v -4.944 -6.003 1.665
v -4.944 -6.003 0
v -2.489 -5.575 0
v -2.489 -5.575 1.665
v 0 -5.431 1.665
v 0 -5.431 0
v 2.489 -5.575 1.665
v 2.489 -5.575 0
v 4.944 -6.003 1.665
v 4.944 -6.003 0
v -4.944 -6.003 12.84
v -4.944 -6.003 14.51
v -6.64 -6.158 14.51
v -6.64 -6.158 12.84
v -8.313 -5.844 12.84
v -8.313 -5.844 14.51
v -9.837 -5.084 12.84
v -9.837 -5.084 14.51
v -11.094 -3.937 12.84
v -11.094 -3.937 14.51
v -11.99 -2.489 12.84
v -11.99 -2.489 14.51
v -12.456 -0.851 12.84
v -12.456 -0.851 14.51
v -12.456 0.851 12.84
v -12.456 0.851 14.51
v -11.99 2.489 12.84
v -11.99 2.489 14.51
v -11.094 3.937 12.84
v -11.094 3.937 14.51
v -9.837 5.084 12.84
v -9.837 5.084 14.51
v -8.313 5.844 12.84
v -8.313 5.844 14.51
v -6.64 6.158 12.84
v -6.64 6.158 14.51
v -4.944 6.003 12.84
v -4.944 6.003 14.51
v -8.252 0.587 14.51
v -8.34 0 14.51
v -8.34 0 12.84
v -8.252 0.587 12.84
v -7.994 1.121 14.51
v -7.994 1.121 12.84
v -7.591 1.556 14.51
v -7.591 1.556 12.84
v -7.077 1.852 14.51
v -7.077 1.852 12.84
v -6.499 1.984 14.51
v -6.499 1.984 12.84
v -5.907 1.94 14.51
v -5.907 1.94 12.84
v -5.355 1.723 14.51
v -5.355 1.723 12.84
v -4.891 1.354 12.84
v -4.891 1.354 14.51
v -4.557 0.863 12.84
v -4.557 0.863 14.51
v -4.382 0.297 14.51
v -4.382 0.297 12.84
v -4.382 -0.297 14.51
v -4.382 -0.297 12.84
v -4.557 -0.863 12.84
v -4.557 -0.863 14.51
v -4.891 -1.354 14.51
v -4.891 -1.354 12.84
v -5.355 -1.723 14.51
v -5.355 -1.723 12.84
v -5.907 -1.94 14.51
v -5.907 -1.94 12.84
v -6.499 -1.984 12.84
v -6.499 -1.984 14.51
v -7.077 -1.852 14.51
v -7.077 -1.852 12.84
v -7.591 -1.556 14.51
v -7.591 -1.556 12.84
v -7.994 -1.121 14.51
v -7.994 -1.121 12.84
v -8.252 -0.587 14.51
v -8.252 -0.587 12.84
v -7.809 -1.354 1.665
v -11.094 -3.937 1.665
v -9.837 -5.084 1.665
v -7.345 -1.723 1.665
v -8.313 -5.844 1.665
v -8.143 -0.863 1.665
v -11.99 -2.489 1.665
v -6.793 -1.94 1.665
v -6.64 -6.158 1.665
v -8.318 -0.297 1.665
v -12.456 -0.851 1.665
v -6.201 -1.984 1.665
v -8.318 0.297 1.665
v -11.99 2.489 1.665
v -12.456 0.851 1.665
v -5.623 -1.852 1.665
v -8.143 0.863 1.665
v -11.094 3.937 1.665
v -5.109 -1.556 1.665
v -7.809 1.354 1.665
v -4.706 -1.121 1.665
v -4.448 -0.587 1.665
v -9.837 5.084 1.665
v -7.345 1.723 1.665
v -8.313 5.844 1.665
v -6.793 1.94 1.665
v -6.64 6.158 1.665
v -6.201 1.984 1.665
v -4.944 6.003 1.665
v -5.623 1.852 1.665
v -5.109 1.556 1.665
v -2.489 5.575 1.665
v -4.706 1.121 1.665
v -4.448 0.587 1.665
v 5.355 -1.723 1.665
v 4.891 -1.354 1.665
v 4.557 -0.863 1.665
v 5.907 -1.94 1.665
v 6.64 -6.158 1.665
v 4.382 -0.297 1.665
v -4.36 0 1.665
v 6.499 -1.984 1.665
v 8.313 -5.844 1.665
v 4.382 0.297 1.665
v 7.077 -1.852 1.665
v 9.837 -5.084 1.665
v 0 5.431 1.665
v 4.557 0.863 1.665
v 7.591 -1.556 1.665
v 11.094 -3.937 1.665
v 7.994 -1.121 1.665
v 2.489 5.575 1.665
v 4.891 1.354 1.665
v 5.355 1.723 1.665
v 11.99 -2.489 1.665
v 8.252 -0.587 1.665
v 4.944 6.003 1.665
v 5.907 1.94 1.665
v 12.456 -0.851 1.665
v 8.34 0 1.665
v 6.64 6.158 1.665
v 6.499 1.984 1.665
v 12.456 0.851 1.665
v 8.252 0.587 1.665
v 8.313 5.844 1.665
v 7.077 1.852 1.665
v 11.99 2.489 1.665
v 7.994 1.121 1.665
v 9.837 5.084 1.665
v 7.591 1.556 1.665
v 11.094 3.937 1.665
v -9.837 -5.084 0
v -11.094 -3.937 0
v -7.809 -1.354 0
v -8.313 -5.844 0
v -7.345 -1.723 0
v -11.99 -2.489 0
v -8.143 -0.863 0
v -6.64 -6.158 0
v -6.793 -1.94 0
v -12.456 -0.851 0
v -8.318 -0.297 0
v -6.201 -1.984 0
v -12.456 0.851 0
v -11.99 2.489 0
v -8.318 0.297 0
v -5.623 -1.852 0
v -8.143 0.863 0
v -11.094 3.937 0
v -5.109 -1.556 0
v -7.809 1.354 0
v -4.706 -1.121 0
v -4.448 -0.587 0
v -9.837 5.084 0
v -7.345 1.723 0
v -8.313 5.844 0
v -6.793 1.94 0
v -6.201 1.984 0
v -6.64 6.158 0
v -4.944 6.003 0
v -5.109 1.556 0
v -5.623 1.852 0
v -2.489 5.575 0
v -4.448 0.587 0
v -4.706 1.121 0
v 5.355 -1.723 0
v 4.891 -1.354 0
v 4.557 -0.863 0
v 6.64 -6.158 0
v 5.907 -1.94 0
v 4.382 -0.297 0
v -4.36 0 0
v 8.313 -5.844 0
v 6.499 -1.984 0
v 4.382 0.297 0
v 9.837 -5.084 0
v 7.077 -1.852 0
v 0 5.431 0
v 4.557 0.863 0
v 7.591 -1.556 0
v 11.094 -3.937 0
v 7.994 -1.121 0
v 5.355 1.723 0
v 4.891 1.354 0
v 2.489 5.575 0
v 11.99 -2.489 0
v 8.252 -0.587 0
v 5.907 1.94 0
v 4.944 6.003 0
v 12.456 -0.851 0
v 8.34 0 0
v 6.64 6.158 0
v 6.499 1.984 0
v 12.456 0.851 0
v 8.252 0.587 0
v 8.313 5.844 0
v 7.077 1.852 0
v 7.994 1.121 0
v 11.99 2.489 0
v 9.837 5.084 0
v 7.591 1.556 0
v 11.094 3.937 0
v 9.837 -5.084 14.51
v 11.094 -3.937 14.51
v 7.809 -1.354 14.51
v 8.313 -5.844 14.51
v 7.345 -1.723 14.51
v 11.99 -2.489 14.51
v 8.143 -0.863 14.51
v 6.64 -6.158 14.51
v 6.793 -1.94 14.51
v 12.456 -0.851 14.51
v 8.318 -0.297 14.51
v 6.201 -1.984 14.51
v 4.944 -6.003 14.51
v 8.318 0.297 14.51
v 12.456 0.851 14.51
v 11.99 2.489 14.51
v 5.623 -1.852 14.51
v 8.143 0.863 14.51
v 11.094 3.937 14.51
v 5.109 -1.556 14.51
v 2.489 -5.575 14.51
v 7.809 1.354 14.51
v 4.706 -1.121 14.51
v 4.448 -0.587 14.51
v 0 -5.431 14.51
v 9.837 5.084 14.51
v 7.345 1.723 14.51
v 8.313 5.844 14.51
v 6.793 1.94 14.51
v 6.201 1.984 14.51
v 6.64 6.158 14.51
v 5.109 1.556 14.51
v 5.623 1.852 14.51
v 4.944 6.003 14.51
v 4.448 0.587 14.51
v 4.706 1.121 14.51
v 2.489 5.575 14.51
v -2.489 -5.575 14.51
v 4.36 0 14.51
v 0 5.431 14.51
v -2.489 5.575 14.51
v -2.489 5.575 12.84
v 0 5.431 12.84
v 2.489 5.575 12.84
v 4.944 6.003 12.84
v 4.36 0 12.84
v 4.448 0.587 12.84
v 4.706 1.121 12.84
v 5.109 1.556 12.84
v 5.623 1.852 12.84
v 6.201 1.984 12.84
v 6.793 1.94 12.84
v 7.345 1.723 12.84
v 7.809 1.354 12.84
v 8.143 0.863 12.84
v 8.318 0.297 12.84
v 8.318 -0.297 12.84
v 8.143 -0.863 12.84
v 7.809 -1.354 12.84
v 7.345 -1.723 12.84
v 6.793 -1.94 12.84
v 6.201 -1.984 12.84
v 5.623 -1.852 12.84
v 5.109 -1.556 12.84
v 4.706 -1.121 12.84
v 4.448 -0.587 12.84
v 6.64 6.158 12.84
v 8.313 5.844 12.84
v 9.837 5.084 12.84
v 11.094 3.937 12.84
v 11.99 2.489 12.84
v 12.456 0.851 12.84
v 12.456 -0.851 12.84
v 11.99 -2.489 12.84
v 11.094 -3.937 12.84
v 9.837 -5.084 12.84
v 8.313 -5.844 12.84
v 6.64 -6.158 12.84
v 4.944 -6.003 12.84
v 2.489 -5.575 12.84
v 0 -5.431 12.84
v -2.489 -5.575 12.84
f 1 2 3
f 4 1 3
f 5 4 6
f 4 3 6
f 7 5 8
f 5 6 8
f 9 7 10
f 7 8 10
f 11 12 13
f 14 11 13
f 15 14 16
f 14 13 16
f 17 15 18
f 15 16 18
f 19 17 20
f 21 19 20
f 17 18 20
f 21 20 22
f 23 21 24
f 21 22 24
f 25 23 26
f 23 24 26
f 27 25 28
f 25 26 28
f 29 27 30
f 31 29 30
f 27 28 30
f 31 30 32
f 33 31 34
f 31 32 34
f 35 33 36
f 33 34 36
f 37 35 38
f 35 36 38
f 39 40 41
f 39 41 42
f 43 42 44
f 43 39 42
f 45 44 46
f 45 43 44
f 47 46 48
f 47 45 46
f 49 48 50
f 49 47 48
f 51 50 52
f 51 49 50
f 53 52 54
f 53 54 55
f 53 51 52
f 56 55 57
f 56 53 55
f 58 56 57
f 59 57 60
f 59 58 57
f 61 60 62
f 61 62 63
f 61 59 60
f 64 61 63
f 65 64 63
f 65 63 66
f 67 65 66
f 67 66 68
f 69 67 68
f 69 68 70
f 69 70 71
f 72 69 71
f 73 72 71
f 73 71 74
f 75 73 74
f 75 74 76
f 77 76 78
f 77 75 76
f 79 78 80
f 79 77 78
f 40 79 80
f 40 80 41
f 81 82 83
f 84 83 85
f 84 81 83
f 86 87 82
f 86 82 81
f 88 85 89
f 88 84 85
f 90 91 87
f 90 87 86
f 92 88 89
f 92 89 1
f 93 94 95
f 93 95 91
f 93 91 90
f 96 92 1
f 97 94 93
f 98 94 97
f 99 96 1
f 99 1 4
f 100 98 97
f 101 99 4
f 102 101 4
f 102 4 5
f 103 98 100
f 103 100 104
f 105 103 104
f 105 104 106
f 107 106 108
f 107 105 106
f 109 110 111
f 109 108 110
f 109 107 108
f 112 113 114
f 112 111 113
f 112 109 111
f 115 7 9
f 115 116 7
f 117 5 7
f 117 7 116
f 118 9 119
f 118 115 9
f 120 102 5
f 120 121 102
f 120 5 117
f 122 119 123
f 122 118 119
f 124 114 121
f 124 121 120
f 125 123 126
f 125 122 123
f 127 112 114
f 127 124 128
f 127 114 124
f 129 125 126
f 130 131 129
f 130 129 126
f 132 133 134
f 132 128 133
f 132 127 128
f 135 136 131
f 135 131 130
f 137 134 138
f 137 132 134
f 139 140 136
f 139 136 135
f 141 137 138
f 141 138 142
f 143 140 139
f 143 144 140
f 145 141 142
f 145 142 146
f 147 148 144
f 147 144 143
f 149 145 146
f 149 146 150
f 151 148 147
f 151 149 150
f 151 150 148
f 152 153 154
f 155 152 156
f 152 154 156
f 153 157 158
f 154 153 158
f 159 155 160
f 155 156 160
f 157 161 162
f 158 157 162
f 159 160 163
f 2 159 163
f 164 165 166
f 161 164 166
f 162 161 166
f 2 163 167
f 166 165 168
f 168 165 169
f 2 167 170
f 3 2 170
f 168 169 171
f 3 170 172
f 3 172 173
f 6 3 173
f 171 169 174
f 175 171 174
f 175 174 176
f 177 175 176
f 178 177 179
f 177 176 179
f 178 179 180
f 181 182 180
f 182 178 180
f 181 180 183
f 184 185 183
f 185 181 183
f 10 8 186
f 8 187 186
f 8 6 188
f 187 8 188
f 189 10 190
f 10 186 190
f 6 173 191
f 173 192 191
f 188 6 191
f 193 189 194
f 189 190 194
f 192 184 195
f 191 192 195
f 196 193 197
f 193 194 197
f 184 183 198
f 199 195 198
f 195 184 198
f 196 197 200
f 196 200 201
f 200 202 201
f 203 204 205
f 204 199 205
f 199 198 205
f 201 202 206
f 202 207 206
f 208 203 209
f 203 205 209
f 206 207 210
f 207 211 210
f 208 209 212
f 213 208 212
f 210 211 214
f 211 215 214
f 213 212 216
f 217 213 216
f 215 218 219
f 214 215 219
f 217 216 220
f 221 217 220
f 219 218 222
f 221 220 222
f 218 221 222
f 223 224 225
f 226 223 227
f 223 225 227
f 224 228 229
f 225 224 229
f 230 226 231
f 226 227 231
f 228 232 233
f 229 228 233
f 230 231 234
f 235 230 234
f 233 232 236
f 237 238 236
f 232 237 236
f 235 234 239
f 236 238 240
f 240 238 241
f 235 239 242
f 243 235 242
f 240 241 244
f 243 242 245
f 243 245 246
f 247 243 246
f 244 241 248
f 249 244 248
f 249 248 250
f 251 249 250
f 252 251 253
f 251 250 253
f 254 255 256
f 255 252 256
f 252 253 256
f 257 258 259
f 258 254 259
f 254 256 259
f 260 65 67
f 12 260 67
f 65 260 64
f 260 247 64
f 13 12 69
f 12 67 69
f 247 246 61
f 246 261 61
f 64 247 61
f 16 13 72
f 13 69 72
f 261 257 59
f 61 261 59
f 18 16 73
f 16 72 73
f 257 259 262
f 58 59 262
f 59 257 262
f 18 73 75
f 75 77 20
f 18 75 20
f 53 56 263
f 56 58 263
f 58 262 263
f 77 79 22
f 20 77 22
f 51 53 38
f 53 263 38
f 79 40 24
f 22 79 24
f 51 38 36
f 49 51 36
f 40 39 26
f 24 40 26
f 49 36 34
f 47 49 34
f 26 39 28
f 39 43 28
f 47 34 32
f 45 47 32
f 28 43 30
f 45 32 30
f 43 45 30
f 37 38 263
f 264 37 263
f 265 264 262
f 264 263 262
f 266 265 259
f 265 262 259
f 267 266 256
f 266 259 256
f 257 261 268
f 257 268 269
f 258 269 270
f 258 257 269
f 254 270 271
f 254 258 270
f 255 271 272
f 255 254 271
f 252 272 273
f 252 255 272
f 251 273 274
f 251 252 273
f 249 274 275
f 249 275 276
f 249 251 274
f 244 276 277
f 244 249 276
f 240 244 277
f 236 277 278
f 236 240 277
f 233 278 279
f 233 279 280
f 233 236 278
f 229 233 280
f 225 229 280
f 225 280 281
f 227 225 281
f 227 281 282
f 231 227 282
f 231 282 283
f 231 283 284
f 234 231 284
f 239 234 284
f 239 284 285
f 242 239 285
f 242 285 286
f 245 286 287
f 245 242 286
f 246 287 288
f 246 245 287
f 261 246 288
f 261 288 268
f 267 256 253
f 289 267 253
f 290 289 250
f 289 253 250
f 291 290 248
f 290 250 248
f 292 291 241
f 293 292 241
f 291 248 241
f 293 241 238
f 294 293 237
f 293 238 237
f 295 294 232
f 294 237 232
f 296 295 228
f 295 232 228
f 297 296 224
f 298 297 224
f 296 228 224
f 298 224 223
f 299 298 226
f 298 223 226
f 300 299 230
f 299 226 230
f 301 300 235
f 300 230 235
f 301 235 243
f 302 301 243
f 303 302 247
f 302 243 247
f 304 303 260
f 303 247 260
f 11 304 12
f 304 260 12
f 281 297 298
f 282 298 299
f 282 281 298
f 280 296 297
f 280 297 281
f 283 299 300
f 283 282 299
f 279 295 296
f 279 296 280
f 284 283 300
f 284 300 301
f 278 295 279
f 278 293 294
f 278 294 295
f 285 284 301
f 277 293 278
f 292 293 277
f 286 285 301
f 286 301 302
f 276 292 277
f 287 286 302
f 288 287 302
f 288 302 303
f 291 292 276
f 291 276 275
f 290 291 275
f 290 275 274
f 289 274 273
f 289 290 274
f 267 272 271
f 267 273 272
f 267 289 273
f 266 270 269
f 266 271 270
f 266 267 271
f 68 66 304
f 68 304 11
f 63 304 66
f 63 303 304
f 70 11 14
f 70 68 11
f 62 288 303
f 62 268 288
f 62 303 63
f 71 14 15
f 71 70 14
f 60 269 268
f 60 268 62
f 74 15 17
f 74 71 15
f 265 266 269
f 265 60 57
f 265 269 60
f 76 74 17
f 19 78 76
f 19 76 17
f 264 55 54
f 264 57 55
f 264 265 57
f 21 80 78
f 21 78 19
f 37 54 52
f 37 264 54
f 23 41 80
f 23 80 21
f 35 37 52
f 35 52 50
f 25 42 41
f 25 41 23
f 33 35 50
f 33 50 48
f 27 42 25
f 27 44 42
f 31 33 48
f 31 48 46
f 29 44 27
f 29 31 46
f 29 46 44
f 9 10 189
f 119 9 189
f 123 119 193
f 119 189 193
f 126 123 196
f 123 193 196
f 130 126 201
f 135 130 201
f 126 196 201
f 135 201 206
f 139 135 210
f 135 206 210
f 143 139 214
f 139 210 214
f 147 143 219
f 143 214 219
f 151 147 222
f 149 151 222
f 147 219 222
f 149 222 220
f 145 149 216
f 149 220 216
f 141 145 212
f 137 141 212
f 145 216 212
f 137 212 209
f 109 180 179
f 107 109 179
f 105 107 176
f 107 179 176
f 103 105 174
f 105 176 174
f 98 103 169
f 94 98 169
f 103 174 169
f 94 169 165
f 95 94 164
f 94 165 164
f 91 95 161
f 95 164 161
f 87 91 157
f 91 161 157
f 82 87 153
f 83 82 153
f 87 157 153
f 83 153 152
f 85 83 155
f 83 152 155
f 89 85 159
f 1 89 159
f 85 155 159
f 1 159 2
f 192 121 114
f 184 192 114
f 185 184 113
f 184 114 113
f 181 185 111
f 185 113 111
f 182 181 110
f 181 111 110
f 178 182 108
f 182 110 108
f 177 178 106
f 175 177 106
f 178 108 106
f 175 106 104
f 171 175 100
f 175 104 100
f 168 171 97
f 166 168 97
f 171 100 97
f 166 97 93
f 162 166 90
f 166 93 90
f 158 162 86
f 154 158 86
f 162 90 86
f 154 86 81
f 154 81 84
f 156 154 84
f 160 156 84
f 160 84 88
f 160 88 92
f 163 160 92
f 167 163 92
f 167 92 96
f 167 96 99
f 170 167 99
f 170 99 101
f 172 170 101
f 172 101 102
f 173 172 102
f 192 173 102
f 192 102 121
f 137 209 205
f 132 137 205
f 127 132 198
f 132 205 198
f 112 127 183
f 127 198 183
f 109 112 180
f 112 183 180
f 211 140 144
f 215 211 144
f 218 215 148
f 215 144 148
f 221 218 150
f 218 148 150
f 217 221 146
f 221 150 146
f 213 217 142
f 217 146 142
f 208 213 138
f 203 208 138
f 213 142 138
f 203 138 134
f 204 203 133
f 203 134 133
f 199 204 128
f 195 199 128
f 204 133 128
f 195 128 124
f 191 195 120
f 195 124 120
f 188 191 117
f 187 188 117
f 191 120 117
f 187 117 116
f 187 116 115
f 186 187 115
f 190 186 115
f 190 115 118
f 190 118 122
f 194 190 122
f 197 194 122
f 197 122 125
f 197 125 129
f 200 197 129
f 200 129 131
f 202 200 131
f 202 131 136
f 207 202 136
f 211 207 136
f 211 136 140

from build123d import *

# Parameters (mm, degrees)
EXTRUDE_1_DEPTH     = 1.665
SKETCH_3_R          = 1.99
CUT_EXTRUDE_1_DEPTH = 15.050077402
SKETCH_4_R          = 1.99
EXTRUDE_1_2_DEPTH   = 1.67


with BuildPart() as part:
    # 草图2 → Extrude 1 (new body)
    with BuildSketch(Plane.XY):
        with BuildLine():
            ThreePointArc((-4.944493019, 6.002647343), (-12.515, 0), (-4.944493019, -6.002647343))
            ThreePointArc((-4.944493019, -6.002647343), (0, -5.4315), (4.944493019, -6.002647343))
            ThreePointArc((4.944493019, -6.002647343), (12.515, 0), (4.944493019, 6.002647343))
            ThreePointArc((4.944493019, 6.002647343), (0, 5.4315), (-4.944493019, 6.002647343))
        make_face()
    extrude(amount=EXTRUDE_1_DEPTH)

    # 草图3 → 切除-拉伸1 (cut, through all)
    with BuildSketch(Plane.XY.offset(1.665)):
        with Locations((-6.35, 0)):
            Circle(SKETCH_3_R)
        with Locations((6.35, 0)):
            Circle(SKETCH_3_R)
    extrude(amount=-CUT_EXTRUDE_1_DEPTH, mode=Mode.SUBTRACT)


with BuildPart() as body_2:
    # 草图4 → Extrude 1 2 (new body)
    with BuildSketch(Plane(origin=(0, 0, 14.51), x_dir=(-1, 0, 0), z_dir=(0, 0, -1))):
        with BuildLine():
            ThreePointArc((4.944493019, -6.002647343), (12.515, 0), (4.944493019, 6.002647343))
            ThreePointArc((4.944493019, 6.002647343), (0, 5.4315), (-4.944493019, 6.002647343))
            ThreePointArc((-4.944493019, 6.002647343), (-12.515, 0), (-4.944493019, -6.002647343))
            ThreePointArc((-4.944493019, -6.002647343), (0, -5.4315), (4.944493019, -6.002647343))
        make_face()
        with Locations((6.35, 0)):
            Circle(SKETCH_4_R, mode=Mode.SUBTRACT)
        with Locations((-6.35, 0)):
            Circle(SKETCH_4_R, mode=Mode.SUBTRACT)
    extrude(amount=EXTRUDE_1_2_DEPTH)


solid = Compound([part.part, body_2.part])
